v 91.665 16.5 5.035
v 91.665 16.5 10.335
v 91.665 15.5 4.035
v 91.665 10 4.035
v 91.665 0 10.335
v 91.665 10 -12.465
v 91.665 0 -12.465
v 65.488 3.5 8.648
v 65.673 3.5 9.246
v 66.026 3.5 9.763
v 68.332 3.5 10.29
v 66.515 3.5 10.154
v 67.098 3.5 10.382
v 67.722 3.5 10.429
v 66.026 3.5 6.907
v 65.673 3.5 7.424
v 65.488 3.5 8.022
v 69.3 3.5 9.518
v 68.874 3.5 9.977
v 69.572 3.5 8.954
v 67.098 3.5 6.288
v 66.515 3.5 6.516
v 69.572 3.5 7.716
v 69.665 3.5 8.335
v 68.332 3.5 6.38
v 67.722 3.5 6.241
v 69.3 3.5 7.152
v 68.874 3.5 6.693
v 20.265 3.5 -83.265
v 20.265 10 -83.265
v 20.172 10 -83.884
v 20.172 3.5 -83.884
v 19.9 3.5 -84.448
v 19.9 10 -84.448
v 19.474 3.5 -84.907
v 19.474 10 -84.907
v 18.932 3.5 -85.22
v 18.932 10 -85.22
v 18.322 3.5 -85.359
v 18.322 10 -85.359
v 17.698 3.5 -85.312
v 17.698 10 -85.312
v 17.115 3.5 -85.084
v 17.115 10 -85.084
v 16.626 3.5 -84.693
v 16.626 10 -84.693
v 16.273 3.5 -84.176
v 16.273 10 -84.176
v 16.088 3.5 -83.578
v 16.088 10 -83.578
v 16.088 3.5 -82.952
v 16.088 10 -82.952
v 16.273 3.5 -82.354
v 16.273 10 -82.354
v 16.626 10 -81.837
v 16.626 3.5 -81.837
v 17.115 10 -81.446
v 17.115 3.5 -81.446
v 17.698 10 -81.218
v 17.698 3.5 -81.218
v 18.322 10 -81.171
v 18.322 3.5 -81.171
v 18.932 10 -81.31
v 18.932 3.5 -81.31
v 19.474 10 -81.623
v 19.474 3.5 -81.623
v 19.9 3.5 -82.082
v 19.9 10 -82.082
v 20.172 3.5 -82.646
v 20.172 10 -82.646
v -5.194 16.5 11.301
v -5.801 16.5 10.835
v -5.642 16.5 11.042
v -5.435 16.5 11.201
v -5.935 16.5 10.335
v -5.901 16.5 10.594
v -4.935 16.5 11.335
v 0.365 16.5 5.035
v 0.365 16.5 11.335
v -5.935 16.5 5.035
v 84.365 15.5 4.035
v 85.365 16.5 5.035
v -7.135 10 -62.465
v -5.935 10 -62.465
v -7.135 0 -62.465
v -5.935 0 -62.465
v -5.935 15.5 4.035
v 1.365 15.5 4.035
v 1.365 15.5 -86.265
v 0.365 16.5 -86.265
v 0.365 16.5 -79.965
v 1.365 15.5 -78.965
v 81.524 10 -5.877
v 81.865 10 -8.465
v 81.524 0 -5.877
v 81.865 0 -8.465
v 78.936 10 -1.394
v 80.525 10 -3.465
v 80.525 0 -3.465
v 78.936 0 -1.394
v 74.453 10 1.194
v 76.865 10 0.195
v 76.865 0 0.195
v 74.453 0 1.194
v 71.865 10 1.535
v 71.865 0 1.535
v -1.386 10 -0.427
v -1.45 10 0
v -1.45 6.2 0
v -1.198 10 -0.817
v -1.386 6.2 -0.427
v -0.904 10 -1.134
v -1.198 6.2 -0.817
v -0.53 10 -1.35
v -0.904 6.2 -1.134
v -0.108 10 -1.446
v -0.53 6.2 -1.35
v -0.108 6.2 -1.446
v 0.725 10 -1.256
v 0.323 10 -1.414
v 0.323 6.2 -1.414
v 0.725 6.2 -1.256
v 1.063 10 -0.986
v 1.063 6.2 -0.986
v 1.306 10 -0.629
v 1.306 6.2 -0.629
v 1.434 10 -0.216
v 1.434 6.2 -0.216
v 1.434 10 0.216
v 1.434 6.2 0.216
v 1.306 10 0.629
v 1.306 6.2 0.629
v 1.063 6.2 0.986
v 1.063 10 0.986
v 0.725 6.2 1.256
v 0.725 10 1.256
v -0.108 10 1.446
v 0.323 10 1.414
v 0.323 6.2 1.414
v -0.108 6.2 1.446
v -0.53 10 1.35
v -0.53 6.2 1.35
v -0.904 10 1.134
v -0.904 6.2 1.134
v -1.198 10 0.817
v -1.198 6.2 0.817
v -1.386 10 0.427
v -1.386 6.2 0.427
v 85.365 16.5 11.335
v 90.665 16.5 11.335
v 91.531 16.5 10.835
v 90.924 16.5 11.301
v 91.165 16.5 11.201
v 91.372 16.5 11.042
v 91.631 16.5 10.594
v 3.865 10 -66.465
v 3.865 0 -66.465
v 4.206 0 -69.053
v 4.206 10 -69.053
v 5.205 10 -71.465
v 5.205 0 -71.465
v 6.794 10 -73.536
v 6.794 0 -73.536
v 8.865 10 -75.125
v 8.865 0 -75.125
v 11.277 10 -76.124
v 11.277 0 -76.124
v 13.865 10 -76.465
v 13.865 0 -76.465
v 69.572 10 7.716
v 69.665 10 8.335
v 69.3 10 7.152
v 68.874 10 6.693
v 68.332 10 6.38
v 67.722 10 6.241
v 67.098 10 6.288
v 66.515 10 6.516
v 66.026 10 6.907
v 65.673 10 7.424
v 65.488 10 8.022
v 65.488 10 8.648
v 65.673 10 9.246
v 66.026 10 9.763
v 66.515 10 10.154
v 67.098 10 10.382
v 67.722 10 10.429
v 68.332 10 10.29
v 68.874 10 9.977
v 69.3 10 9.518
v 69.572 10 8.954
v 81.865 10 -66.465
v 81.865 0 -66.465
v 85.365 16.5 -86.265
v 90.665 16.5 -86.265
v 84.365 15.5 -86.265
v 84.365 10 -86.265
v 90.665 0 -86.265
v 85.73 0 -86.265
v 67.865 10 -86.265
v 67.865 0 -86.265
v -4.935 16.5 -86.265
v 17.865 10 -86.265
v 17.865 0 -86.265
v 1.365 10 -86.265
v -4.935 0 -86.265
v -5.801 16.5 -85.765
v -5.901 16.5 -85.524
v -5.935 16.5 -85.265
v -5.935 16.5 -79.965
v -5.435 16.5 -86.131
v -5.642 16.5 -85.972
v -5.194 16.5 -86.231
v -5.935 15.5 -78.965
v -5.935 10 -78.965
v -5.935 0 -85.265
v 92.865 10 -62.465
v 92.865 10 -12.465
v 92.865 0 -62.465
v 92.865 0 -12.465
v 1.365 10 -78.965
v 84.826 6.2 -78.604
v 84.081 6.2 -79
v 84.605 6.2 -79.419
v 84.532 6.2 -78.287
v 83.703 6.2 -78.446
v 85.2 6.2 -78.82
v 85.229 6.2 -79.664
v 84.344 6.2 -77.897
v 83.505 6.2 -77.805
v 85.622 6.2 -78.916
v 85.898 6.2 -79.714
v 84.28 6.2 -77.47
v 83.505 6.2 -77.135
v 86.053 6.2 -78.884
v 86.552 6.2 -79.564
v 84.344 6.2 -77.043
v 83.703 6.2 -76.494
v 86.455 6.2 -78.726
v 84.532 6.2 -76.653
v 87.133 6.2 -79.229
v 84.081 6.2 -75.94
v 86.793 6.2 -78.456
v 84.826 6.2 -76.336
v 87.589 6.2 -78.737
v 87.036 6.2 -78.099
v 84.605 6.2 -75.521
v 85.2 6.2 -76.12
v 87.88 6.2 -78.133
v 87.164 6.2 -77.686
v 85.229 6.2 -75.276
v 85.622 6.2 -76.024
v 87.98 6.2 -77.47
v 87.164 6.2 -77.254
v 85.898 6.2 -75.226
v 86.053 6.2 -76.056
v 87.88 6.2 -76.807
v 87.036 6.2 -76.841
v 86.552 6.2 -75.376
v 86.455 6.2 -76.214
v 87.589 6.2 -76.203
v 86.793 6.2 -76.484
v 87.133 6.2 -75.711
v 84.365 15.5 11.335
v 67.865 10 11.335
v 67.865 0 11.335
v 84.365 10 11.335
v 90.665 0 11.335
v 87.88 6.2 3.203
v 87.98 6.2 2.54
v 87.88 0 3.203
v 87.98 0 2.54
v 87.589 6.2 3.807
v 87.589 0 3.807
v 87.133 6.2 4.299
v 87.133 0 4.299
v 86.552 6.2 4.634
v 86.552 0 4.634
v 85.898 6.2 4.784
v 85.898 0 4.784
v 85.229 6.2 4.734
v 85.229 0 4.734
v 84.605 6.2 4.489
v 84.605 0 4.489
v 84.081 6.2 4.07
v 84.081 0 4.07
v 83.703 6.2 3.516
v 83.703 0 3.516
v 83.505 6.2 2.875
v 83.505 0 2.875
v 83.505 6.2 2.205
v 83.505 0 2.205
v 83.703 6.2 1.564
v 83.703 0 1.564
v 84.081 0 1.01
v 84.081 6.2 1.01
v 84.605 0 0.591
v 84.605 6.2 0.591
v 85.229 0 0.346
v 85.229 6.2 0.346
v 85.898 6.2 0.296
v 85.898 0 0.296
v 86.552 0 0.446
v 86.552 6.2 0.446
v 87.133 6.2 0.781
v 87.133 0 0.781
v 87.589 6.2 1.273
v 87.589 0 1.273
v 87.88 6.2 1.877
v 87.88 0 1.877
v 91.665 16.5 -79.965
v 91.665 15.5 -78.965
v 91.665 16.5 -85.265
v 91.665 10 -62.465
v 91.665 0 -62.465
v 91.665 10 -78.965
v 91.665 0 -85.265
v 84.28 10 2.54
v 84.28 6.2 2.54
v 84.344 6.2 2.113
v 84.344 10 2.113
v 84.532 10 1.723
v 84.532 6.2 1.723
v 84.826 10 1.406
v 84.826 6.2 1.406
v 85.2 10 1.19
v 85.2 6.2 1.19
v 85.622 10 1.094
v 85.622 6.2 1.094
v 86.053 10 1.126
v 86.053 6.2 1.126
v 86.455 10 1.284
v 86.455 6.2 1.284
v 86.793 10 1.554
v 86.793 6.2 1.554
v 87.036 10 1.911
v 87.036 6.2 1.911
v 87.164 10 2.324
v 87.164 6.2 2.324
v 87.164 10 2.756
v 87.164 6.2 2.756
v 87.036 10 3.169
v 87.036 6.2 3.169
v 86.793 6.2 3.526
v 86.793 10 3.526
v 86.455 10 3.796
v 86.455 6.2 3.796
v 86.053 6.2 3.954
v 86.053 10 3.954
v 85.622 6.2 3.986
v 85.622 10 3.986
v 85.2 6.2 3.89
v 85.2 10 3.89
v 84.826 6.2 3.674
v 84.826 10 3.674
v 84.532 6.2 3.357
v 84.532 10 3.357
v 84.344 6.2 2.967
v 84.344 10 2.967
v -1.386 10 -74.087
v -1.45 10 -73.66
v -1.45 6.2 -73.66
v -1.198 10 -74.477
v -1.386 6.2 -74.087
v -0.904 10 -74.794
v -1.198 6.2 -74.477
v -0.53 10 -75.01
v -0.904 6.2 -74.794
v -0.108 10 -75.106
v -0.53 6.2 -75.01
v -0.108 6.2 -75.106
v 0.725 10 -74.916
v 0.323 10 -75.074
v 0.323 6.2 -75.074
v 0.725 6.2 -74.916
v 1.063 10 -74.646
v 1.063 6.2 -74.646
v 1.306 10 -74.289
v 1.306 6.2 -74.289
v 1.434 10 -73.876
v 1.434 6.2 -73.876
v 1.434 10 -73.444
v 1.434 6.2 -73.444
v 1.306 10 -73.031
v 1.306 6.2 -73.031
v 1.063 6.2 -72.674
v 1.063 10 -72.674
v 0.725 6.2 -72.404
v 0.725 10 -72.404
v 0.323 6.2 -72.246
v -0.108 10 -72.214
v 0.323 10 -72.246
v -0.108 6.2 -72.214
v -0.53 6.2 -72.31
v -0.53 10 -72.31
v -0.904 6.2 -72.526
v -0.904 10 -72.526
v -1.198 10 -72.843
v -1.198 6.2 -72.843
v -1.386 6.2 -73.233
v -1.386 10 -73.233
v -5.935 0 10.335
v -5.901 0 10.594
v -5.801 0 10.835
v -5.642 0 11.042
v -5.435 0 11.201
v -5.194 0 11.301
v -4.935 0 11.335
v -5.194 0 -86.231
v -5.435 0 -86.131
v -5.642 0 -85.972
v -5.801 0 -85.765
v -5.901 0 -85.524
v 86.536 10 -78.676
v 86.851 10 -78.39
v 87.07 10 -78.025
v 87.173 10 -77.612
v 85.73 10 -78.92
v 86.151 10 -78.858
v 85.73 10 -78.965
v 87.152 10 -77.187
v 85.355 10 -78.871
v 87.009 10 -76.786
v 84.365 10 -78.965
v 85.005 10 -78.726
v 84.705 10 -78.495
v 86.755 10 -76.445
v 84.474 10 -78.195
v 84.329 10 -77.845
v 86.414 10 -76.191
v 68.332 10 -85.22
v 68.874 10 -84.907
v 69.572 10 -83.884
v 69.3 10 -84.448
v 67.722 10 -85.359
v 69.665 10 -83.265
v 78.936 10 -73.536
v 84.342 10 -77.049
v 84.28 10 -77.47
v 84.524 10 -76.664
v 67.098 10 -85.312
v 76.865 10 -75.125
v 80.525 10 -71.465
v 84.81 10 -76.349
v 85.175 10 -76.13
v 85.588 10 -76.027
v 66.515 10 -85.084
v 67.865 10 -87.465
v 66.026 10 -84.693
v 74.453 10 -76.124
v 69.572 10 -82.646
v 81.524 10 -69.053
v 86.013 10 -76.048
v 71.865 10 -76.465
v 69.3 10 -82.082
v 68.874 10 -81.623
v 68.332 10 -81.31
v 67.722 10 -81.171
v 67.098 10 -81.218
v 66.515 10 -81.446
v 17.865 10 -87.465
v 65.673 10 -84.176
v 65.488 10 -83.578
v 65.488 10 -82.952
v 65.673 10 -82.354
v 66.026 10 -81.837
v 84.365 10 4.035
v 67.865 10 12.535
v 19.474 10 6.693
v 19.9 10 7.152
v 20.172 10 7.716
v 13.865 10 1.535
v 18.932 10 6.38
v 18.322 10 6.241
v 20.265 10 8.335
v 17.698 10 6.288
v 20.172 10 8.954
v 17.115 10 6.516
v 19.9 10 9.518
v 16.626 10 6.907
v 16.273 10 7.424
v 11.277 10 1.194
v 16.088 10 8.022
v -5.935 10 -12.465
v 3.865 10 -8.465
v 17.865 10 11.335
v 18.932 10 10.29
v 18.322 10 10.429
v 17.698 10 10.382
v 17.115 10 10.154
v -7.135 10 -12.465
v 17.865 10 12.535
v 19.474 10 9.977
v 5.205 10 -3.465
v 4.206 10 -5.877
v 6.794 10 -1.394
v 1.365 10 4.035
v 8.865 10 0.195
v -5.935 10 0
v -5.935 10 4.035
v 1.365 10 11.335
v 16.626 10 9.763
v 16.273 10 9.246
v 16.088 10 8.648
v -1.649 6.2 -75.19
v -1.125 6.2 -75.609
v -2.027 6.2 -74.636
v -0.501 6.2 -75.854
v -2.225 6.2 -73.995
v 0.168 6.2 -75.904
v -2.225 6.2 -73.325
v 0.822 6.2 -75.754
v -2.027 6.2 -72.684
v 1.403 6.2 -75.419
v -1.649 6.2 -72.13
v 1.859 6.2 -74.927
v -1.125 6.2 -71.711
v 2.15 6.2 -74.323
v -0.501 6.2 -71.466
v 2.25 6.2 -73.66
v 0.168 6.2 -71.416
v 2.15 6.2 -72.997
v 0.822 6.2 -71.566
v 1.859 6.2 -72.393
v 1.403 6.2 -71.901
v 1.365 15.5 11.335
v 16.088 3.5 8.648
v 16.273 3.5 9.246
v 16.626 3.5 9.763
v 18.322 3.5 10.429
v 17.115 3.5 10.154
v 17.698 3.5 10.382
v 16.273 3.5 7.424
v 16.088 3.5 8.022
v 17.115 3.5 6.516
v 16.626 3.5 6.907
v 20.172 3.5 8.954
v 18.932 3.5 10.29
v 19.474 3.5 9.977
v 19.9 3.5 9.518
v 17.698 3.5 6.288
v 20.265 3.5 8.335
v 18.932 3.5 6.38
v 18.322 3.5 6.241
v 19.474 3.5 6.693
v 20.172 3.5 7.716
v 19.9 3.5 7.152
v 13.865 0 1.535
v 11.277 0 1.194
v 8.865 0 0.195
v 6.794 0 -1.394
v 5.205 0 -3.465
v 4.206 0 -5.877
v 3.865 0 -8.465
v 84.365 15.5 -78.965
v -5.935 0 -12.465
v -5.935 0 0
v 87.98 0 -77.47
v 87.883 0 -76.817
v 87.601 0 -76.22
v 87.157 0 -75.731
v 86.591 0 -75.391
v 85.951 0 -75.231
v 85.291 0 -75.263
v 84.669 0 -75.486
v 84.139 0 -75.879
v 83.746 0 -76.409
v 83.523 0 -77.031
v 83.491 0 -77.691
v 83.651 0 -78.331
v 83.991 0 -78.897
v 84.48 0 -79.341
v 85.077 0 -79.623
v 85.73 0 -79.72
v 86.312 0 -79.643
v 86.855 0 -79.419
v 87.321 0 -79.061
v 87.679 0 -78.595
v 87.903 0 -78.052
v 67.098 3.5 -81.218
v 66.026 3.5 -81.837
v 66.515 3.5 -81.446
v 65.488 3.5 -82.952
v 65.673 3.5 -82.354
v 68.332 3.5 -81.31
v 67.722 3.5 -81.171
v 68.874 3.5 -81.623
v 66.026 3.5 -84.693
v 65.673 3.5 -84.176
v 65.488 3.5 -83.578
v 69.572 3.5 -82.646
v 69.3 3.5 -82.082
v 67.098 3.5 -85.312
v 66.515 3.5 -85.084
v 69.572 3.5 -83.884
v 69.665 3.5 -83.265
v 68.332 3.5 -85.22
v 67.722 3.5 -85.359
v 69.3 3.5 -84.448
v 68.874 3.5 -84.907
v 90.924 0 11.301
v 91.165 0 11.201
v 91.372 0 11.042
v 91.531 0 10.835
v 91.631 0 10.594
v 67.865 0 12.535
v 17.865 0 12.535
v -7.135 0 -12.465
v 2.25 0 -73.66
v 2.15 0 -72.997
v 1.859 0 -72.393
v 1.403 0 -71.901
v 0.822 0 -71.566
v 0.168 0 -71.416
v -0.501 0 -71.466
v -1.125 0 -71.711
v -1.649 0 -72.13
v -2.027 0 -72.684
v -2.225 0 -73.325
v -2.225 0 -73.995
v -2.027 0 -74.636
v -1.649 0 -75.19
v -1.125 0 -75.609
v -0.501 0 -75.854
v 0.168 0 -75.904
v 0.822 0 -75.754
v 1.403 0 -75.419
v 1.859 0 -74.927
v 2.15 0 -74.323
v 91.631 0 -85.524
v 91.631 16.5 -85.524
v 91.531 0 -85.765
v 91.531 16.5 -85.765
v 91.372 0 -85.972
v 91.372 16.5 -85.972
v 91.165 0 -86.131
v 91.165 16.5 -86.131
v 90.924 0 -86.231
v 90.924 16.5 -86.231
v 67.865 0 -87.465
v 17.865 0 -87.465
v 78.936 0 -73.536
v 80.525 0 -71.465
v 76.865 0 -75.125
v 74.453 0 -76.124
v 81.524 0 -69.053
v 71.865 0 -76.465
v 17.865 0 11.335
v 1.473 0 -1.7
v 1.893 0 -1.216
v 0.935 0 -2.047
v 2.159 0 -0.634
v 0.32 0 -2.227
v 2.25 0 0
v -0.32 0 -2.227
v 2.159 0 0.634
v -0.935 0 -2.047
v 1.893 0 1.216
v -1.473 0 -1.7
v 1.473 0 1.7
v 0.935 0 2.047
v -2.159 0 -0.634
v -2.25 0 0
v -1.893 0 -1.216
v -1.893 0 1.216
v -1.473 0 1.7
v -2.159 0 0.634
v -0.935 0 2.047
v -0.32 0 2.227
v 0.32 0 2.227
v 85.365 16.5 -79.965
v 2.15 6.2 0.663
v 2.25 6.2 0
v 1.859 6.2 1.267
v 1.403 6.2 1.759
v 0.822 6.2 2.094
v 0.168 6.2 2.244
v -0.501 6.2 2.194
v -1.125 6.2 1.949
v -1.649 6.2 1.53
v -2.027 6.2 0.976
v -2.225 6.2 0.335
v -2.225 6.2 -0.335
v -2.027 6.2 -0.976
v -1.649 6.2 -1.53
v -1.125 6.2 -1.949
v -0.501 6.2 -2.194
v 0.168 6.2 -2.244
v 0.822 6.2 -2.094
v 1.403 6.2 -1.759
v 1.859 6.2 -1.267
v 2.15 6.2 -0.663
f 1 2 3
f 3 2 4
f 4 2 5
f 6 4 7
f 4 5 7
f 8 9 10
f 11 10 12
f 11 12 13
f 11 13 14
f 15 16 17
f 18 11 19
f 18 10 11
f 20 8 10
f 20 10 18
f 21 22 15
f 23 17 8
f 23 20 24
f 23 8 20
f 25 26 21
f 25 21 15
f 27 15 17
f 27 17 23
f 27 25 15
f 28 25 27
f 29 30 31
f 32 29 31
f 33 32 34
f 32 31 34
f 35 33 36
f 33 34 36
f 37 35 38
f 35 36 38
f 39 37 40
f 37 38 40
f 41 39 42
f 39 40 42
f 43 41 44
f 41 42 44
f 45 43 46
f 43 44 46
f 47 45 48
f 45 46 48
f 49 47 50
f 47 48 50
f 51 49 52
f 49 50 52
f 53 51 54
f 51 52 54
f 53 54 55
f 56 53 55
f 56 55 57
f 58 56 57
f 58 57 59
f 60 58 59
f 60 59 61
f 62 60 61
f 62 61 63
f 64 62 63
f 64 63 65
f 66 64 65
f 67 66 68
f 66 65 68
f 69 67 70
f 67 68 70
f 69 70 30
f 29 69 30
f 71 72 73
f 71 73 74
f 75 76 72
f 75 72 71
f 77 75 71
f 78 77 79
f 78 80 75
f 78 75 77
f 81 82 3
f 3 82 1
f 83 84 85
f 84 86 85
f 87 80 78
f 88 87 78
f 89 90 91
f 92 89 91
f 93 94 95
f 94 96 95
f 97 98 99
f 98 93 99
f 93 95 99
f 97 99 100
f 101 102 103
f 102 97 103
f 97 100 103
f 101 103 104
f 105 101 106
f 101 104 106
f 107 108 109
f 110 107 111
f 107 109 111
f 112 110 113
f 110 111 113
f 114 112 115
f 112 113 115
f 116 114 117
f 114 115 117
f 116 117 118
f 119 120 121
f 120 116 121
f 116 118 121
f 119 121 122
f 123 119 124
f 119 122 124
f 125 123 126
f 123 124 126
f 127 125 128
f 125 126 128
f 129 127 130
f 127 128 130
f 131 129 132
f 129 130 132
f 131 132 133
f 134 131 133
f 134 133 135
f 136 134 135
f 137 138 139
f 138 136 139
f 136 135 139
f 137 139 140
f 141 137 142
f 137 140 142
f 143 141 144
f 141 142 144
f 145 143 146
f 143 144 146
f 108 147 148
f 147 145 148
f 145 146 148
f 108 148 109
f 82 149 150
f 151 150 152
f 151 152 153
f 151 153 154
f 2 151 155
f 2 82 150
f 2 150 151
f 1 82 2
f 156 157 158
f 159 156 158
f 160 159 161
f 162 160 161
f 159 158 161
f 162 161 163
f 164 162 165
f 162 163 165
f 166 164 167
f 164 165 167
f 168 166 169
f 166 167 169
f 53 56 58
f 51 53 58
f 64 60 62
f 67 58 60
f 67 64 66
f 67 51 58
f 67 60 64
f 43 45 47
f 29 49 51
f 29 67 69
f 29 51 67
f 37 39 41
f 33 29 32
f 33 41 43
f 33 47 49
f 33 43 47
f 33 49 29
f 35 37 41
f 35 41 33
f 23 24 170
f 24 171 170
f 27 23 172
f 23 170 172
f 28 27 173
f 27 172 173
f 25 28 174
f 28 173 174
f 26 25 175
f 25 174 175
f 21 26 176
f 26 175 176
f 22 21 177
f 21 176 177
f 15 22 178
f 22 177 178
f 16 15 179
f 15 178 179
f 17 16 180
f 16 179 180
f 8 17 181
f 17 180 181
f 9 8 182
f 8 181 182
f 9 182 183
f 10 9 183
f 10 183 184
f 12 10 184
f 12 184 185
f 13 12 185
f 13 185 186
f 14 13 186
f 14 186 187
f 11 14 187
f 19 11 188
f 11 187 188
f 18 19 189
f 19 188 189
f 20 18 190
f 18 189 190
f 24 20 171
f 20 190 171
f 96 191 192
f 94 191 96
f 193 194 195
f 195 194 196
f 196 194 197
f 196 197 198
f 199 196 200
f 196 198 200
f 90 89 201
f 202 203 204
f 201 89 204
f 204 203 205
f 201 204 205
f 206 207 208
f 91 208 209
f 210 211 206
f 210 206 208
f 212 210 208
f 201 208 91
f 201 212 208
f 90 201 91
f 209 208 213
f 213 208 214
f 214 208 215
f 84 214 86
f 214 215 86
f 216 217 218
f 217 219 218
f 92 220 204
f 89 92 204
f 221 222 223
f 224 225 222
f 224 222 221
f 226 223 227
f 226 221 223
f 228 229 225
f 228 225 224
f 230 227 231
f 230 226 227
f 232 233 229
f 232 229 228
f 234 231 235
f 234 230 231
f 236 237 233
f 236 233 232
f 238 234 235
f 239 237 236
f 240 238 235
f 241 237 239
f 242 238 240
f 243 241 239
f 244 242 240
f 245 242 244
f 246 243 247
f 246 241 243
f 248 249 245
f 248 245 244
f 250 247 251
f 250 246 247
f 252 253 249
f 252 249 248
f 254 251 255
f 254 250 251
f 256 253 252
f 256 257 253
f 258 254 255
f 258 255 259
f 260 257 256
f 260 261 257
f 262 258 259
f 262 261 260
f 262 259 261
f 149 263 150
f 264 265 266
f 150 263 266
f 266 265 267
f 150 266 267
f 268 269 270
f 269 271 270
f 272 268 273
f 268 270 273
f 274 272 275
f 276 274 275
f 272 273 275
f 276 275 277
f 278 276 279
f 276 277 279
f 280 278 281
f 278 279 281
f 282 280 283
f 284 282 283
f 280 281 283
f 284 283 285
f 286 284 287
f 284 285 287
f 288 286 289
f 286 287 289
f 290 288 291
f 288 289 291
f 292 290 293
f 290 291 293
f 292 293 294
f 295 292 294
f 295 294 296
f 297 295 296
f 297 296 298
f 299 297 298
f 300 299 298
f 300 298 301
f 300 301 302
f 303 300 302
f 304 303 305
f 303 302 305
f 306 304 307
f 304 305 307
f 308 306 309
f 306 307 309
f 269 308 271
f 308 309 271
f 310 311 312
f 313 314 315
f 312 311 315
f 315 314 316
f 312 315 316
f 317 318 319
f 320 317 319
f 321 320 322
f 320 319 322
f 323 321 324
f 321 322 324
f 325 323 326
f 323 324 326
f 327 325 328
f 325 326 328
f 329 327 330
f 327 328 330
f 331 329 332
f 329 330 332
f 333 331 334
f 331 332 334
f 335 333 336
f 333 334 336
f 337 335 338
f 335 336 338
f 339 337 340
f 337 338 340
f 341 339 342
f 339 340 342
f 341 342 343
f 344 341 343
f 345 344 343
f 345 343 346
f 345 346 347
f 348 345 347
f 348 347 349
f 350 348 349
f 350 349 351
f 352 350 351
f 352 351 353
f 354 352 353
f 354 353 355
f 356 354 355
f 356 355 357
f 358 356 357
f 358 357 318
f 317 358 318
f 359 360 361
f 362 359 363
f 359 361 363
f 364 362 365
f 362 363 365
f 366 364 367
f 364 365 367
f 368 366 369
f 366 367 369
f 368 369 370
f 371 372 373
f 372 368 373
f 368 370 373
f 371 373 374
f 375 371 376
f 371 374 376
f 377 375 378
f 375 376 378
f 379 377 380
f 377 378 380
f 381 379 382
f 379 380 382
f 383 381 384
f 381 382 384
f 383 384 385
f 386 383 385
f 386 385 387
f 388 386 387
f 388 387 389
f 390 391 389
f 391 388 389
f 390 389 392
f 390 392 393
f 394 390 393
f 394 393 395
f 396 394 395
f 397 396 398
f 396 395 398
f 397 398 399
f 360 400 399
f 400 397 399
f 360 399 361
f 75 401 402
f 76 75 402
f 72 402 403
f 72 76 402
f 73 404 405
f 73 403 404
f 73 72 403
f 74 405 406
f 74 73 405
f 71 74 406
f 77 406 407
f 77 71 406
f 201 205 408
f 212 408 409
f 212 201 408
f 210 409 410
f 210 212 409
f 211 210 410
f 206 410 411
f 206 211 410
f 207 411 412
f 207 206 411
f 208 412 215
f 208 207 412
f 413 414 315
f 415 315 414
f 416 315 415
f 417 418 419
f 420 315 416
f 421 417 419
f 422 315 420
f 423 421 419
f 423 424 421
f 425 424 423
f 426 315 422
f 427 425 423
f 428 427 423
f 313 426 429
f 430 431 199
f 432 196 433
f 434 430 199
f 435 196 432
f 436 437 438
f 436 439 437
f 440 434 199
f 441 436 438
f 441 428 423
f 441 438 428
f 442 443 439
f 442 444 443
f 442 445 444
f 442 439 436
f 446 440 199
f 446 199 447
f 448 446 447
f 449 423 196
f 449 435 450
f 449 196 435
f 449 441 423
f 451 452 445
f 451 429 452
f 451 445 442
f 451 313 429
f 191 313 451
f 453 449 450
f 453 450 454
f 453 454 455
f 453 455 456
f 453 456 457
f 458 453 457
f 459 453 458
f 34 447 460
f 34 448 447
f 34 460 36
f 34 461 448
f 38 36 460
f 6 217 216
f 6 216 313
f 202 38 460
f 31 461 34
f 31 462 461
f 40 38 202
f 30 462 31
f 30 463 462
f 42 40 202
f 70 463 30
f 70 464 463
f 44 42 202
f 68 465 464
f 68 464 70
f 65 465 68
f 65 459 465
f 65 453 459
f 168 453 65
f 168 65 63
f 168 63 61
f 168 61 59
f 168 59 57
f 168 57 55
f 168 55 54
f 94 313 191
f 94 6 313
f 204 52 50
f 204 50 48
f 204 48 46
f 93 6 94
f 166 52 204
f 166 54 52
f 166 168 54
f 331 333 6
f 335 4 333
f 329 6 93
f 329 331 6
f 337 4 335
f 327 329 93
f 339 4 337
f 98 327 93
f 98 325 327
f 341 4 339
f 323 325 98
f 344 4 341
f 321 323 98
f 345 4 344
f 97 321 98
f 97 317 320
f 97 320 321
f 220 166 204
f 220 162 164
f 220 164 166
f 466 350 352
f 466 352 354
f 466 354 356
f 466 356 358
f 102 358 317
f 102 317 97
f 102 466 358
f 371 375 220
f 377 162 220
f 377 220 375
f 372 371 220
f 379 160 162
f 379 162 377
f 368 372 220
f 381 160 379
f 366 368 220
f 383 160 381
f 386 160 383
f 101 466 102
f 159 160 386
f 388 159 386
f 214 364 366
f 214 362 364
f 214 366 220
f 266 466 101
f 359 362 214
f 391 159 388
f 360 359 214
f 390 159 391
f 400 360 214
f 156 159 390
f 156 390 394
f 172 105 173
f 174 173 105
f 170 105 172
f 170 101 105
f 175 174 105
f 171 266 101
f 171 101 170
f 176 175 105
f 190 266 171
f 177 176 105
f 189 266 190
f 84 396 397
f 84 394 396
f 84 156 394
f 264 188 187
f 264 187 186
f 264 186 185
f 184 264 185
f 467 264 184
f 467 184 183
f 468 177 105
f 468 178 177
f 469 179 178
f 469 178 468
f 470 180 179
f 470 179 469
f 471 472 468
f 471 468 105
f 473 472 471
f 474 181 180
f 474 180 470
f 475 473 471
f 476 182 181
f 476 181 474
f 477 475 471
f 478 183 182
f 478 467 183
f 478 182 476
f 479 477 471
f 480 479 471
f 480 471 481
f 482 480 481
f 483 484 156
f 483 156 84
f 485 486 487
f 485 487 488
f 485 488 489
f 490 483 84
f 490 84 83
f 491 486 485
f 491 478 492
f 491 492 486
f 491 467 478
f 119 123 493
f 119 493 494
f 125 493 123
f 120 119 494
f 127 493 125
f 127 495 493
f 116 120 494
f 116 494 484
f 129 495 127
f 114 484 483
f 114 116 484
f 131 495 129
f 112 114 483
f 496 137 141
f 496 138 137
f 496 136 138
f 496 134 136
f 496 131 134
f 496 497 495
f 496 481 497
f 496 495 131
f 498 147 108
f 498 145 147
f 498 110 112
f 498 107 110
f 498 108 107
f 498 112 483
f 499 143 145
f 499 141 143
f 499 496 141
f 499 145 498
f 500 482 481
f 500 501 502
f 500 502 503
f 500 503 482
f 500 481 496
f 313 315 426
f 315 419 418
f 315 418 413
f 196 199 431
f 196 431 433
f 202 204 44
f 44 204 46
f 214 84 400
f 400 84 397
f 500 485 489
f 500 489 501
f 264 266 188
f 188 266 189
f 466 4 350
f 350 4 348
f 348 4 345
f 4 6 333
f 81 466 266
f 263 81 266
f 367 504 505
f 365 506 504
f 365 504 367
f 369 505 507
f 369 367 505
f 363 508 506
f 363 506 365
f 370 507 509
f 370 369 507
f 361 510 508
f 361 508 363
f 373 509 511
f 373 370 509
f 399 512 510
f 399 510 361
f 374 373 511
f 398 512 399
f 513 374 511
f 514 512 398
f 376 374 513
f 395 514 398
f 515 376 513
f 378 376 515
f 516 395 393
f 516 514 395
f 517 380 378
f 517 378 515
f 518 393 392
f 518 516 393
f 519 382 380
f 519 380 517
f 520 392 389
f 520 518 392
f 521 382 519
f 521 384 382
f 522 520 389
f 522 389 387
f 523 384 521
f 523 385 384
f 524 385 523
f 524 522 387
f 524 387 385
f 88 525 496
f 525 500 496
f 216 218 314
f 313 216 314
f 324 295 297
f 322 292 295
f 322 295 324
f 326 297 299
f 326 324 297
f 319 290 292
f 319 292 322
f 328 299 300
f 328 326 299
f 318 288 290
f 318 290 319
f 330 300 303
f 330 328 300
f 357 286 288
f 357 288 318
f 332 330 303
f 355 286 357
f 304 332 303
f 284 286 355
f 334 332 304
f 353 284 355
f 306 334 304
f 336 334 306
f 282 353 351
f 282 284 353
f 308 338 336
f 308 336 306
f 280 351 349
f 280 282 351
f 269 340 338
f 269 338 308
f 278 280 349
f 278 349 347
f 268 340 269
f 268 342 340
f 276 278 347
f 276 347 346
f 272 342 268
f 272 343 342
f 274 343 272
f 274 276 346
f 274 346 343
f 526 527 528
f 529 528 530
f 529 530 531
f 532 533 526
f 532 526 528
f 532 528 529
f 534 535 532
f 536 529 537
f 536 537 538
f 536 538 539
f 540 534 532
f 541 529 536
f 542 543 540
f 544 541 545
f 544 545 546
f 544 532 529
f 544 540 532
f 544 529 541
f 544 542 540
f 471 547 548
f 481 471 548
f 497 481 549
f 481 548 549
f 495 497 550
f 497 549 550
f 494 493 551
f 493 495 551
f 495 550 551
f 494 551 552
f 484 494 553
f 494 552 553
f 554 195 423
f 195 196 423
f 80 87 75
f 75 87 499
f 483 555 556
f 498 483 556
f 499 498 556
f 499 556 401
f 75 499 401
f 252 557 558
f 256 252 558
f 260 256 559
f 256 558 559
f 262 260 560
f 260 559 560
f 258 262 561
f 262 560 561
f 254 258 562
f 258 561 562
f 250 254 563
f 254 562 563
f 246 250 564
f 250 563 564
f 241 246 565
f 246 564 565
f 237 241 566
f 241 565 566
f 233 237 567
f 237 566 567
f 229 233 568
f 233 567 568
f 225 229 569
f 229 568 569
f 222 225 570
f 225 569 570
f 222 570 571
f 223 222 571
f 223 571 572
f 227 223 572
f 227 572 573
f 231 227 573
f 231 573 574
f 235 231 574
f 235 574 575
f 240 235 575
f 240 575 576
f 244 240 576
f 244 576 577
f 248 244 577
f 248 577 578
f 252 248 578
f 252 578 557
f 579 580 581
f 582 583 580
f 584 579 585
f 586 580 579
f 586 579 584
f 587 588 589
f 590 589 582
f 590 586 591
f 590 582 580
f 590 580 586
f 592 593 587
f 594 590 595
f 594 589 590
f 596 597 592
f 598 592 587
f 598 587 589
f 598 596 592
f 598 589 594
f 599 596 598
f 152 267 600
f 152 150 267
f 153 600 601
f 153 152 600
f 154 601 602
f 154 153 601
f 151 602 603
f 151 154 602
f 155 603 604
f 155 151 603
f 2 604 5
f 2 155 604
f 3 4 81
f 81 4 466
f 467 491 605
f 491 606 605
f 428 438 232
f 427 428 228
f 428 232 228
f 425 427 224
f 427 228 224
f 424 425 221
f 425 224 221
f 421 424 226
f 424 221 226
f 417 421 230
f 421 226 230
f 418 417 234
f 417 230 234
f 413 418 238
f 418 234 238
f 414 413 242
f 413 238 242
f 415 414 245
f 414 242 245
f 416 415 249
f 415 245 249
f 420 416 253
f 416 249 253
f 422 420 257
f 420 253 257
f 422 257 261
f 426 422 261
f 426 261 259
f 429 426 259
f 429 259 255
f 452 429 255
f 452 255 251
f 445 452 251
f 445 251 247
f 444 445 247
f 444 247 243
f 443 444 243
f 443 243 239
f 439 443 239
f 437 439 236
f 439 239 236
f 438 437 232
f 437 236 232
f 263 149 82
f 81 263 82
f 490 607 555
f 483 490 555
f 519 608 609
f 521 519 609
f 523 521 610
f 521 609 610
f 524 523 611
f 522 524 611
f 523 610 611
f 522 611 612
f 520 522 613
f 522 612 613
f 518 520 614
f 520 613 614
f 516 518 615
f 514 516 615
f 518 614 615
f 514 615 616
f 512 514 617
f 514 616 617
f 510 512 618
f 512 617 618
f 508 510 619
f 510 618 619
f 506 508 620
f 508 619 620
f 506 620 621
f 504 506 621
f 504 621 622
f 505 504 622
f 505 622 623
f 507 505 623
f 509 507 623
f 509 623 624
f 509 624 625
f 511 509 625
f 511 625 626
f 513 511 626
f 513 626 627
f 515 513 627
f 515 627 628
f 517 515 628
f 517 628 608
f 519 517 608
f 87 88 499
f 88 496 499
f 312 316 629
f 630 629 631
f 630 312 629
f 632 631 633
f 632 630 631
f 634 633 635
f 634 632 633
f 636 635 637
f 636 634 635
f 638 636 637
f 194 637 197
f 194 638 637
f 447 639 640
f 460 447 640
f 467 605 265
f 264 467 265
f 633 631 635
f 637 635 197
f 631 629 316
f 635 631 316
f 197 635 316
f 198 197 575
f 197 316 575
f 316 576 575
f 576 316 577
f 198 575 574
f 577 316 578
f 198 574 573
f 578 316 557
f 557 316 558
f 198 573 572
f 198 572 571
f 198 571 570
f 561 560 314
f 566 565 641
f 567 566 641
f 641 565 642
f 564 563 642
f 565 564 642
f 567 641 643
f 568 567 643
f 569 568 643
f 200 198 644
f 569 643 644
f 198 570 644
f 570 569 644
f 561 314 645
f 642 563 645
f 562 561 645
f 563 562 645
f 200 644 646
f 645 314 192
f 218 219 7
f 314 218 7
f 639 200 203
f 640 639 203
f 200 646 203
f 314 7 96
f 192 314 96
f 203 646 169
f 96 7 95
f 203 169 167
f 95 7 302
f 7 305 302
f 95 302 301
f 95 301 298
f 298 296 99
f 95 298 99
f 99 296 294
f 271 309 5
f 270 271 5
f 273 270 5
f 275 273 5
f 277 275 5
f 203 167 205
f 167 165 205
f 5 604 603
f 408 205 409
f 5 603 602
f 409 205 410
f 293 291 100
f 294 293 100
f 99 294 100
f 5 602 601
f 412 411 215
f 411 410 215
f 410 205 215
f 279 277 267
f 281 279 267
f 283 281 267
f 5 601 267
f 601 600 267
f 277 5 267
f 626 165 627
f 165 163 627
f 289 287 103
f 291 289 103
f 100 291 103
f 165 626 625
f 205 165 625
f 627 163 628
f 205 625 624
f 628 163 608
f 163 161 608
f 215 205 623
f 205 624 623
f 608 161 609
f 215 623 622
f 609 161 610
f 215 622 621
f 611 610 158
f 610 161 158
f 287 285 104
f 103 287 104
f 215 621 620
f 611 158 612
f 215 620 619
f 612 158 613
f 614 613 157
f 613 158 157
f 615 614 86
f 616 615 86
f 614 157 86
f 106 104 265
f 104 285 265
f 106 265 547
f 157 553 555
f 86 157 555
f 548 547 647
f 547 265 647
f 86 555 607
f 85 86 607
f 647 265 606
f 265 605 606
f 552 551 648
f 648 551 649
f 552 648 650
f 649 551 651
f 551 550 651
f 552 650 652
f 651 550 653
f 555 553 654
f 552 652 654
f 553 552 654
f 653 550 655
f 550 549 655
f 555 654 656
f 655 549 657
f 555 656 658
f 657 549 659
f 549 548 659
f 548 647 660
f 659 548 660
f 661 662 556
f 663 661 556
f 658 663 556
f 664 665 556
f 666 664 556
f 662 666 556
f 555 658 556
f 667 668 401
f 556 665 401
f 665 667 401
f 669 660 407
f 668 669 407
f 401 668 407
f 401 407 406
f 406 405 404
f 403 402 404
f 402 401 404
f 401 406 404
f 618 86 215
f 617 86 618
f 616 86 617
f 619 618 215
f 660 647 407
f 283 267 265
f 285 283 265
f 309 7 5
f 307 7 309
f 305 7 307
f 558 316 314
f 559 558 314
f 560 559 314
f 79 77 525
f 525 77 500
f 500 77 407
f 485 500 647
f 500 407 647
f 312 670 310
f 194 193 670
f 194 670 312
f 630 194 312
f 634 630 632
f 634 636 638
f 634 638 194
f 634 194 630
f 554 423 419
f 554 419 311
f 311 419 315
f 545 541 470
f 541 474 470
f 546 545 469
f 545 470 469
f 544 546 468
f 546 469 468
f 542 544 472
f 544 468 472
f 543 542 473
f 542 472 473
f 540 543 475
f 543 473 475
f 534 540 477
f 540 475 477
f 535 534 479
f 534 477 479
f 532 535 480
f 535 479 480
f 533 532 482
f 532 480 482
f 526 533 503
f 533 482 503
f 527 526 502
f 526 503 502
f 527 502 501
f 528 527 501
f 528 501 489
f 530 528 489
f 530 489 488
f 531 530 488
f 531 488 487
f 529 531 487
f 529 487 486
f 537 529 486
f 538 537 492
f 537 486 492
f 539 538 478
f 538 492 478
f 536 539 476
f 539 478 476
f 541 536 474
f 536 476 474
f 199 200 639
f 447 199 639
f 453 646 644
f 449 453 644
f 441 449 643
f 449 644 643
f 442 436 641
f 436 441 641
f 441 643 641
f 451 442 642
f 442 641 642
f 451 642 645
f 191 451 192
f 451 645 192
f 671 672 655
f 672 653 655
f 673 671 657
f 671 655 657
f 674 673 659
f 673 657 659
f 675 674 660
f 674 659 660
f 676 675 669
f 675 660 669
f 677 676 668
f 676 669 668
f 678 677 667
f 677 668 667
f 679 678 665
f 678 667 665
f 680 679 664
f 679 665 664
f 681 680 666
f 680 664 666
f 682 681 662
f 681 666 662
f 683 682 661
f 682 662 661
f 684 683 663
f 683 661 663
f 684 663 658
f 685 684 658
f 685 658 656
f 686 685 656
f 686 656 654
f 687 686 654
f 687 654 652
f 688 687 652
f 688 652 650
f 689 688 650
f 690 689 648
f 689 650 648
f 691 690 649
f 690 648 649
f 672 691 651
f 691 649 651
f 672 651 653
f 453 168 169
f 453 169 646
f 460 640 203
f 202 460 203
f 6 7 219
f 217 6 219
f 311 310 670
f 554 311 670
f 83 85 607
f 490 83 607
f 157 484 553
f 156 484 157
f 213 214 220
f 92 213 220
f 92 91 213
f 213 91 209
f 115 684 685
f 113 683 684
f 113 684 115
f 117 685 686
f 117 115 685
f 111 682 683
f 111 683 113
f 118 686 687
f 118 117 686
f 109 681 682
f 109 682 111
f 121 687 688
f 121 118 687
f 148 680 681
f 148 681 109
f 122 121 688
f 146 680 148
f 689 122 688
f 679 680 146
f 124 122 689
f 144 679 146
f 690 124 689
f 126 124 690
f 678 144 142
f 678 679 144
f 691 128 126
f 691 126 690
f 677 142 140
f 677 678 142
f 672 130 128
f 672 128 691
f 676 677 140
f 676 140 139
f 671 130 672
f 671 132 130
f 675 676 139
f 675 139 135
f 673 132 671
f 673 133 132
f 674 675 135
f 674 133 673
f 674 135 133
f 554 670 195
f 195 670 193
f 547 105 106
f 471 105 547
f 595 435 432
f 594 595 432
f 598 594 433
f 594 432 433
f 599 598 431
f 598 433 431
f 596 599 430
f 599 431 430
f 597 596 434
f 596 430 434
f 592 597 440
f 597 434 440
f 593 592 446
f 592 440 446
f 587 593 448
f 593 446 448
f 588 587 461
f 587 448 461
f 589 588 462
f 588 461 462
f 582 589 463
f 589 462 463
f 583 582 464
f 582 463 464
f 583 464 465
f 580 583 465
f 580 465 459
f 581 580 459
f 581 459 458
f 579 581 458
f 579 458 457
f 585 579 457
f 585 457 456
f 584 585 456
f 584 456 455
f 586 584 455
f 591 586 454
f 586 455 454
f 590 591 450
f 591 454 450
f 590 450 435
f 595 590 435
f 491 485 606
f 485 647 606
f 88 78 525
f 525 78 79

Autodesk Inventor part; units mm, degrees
ref_plane "YZ Plane" through (0, 0, 0) normal (1, 0, 0) x (0, 1, 0)
ref_plane "XZ Plane" through (0, 0, 0) normal (0, 1, 0) x (-1, 0, 0)
ref_plane "XY Plane" through (0, 0, 0) normal (0, 0, 1) x (1, 0, 0)
sketch "Sketch1" plane through (0, 0, 0) normal (0, 1, 0) x (-1, 0, 0)
  circle A0 centre (0, 0) radius 1.45
  circle A1 centre (0, -73.66) radius 1.45
  circle A2 centre (-85.73, -77.47) radius 1.45
  circle A3 centre (-85.73, 2.54) radius 1.45
  line L0 (7.135, 12.535) -> (-92.865, 12.535)
  line L1 (-92.865, 12.535) -> (-92.865, -87.465)
  line L2 (-92.865, -87.465) -> (7.135, -87.465)
  line L3 (7.135, -87.465) -> (7.135, 12.535)
  line L4 (0, 0) -> (7.135, 0)
  line L5 (-85.73, 2.54) -> (-92.865, 2.54)
  line L6 (-85.73, -77.47) -> (-85.73, -87.465)
  line L7 (-85.73, 2.54) -> (-85.73, 12.535)
  point P0 (0, 0)
  dimension "d0" = 73.66
  dimension "d1" = 80.01
  dimension "d2" = 85.73
  dimension "d3" = 2.54
  dimension "d4" = 3.81
  dimension "d6" = 2.9
  dimension "d7" = 100
  dimension "d8" = 100
extrude "Extrusion1" add sketch "Sketch1" along normal blind 10 contours L3 L2 L1 L5 A3 L7 L0 | L7 A3 L5 L1 L0
sketch "Sketch4" plane through (0, 0, 0) normal (0, -1, 0) x (1, 0, 0)
  line L0 (92.865, -87.465) -> (-7.135, -87.465) projected
  line L1 (92.865, 12.535) -> (92.865, -87.465) projected
  line L2 (-7.135, 12.535) -> (92.865, 12.535) projected
  line L3 (-7.135, -87.465) -> (-7.135, 12.535) projected
  circle A0 centre (85.73, 2.54) radius 1.45 projected
  circle A1 centre (0, 0) radius 1.45 projected
  circle A2 centre (85.73, -77.47) radius 1.45 projected
  circle A3 centre (0, -73.66) radius 1.45 projected
  circle A4 centre (0, 0) radius 2.25
  circle A5 centre (0, -73.66) radius 2.25
  circle A6 centre (85.73, -77.47) radius 2.25
  circle A7 centre (85.73, 2.54) radius 2.25
  point P0 (0, 0)
  dimension "d13" = 4.5
  dimension "d14" = 4.5
  dimension "d15" = 4.5
  dimension "d16" = 4.5
extrude "Extrusion2" cut sketch "Sketch4" against normal blind 6.2 contours A0 | A1 | A2 | A3 | A4 | A5 | A6 | A7
sketch "Sketch5" plane through (0, 0, 0) normal (0, -1, 0) x (1, 0, 0)
  circle A0 centre (85.73, 2.54) radius 2.25 projected
  circle A1 centre (0, 0) radius 2.25 projected
  circle A2 centre (85.73, -77.47) radius 2.25 projected
  circle A3 centre (0, -73.66) radius 2.25 projected
  line L0 (92.865, -87.465) -> (-7.135, -87.465) projected
  line L1 (92.865, 12.535) -> (92.865, -87.465) projected
  line L2 (-7.135, 12.535) -> (92.865, 12.535) projected
  line L3 (-7.135, -87.465) -> (-7.135, 12.535) projected
  line L4 (-7.135, -87.465) -> (92.865, 12.535)
  line L5 (-7.135, -12.465) -> (-5.935, -12.465)
  line L6 (-5.935, -12.465) -> (-5.935, 11.335)
  line L7 (-5.935, 11.335) -> (17.865, 11.335)
  line L8 (17.865, 11.335) -> (17.865, 12.535)
  line L9 (-7.135, 12.535) -> (92.865, 12.535) projected
  line L10 (17.865, -86.265) -> (-5.935, -86.265)
  line L11 (-5.935, -62.465) -> (-7.135, -62.465)
  line L12 (-5.935, -86.265) -> (-5.935, -62.465)
  line L13 (17.865, -87.465) -> (17.865, -86.265)
  line L14 (91.665, -62.465) -> (91.665, -86.265)
  line L15 (67.865, -86.265) -> (67.865, -87.465)
  line L16 (91.665, -86.265) -> (67.865, -86.265)
  line L17 (92.865, -62.465) -> (91.665, -62.465)
  line L18 (67.865, 11.335) -> (91.665, 11.335)
  line L19 (91.665, -12.465) -> (92.865, -12.465)
  line L20 (91.665, 11.335) -> (91.665, -12.465)
  line L21 (67.865, 12.535) -> (67.865, 11.335)
  point P0 (0, 0)
  point P1 (42.865, -37.465)
  point P2 (17.865, 12.535)
  point P3 (17.865, -87.465)
  point P4 (-7.135, -62.465)
  point P5 (67.865, -87.465)
  point P6 (92.865, -62.465)
  point P7 (67.865, 12.535)
  point P8 (92.865, -12.465)
  dimension "d19" = 1.2
  dimension "d20" = 1.2
  dimension "d21" = 25
  dimension "d22" = 25
  dimension "d27" = 360
extrude "Extrusion3" cut sketch "Sketch5" along normal through all both and the other way through all contours L18 L21 L2 L4 | L4 L1 L19 L20 | L10 L13 L0 L4 | L4 L3 L11 L12 | L1 L0 L15 L16 L14 L17 | L8 L7 L6 L5 L3 L2
fillet "Fillet1" radius 1 4 edges at (-5.935, 5, -86.265) (91.665, 5, -86.265) (-5.935, 5, 11.335) (91.665, 5, 11.335)
sketch "Sketch6" plane through (0, 10, 0) normal (0, 1, 0) x (1, 0, 0)
  arc A0 (90.665, -11.335) -> (91.665, -10.335) centre (90.665, -10.335) ccw projected
  line L0 (91.665, -10.335) -> (91.665, 12.465) projected
  line L1 (91.665, 12.465) -> (92.865, 12.465) projected
  line L2 (92.865, 12.465) -> (92.865, 62.465) projected
  line L3 (92.865, 62.465) -> (91.665, 62.465) projected
  line L4 (91.665, 62.465) -> (91.665, 85.265) projected
  arc A1 (91.665, 85.265) -> (90.665, 86.265) centre (90.665, 85.265) ccw projected
  line L5 (90.665, 86.265) -> (67.865, 86.265) projected
  line L6 (67.865, 86.265) -> (67.865, 87.465) projected
  line L7 (67.865, 87.465) -> (17.865, 87.465) projected
  line L8 (17.865, 87.465) -> (17.865, 86.265) projected
  line L9 (17.865, 86.265) -> (-4.935, 86.265) projected
  arc A2 (-4.935, 86.265) -> (-5.935, 85.265) centre (-4.935, 85.265) ccw projected
  line L10 (-5.935, 85.265) -> (-5.935, 62.465) projected
  line L11 (-5.935, 62.465) -> (-7.135, 62.465) projected
  line L12 (-7.135, 62.465) -> (-7.135, 12.465) projected
  line L13 (-7.135, 12.465) -> (-5.935, 12.465) projected
  line L14 (-5.935, 12.465) -> (-5.935, -10.335) projected
  arc A3 (-5.935, -10.335) -> (-4.935, -11.335) centre (-4.935, -10.335) ccw projected
  line L15 (-4.935, -11.335) -> (17.865, -11.335) projected
  line L16 (17.865, -11.335) -> (17.865, -12.535) projected
  line L17 (17.865, -12.535) -> (67.865, -12.535) projected
  line L18 (67.865, -12.535) -> (67.865, -11.335) projected
  line L19 (67.865, -11.335) -> (90.665, -11.335) projected
  circle A4 centre (0, 73.66) radius 1.45 projected
  circle A5 centre (85.73, 77.47) radius 1.45 projected
  circle A6 centre (0, 0) radius 1.45 projected
  circle A7 centre (85.73, -2.54) radius 1.45 projected
  line L20 (-5.935, -11.335) -> (1.365, -11.335)
  line L21 (1.365, -11.335) -> (1.365, -4.035)
  line L22 (1.365, -4.035) -> (-5.935, -4.035)
  line L23 (-5.935, -4.035) -> (-5.935, -11.335)
  line L24 (-7.135, 62.465) -> (-7.135, 12.465) projected
  line L25 (-7.135, 37.465) -> (92.865, 37.465)
  line L26 (92.865, 12.465) -> (92.865, 62.465) projected
  line L27 (84.365, -11.335) -> (91.665, -11.335)
  line L28 (84.365, -4.035) -> (84.365, -11.335)
  line L29 (91.665, -4.035) -> (84.365, -4.035)
  line L30 (91.665, -11.335) -> (91.665, -4.035)
  line L31 (91.665, 78.965) -> (91.665, 86.265)
  line L32 (84.365, 78.965) -> (91.665, 78.965)
  line L33 (84.365, 86.265) -> (84.365, 78.965)
  line L34 (91.665, 86.265) -> (84.365, 86.265)
  line L35 (1.365, 86.265) -> (-5.935, 86.265)
  line L36 (1.365, 78.965) -> (1.365, 86.265)
  line L37 (-5.935, 78.965) -> (1.365, 78.965)
  line L38 (-5.935, 86.265) -> (-5.935, 78.965)
  point P0 (0, 0)
  point P1 (-5.935, -4.035)
  point P2 (1.365, -11.335)
  point P3 (42.865, 37.465)
  point P4 (-5.935, 78.965)
  point P5 (84.365, 86.265)
  point P6 (85.6076, 78.965)
  point P7 (85.8524, 78.965)
  point P8 (91.665, 78.965)
  point P9 (91.665, -4.035)
  point P10 (84.365, -11.335)
  dimension "d30" = 7.3
  dimension "d31" = 7.3
  dimension "d39" = 360
extrude "Extrusion4" add sketch "Sketch6" along normal blind 6.5 contours L19 L28 L29 L0 A0 | L15 A3 L14 L22 L21 | L32 L33 L5 A1 L4 | L10 A2 L9 L36 L37
chamfer "Chamfer1" distance 1 angle 45 8 edges at (-2.285, 16.5, 4.035) (1.365, 16.5, 7.685) (1.365, 16.5, -82.615) (-2.285, 16.5, -78.965) (84.365, 16.5, -82.615) (88.015, 16.5, -78.965) (88.015, 16.5, 4.035) (84.365, 16.5, 7.685)
sketch "Sketch7" plane through (0, 10, 0) normal (0, 1, 0) x (1, 0, 0)
  circle A0 centre (85.73, -2.54) radius 1.45 projected
  circle A1 centre (0, 0) radius 1.45 projected
  circle A2 centre (85.73, 77.47) radius 1.45 projected
  circle A3 centre (0, 73.66) radius 1.45 projected
  line L0 (1.365, 86.265) -> (1.365, 78.965) projected
  line L1 (1.365, 78.965) -> (-5.935, 78.965) projected
  line L2 (-5.935, 78.965) -> (-5.935, 62.465) projected
  line L3 (-5.935, 62.465) -> (-7.135, 62.465) projected
  line L4 (-7.135, 62.465) -> (-7.135, 12.465) projected
  line L5 (-7.135, 12.465) -> (-5.935, 12.465) projected
  line L6 (-5.935, 12.465) -> (-5.935, -4.035) projected
  line L7 (-5.935, -4.035) -> (1.365, -4.035) projected
  line L8 (1.365, -4.035) -> (1.365, -11.335) projected
  line L9 (1.365, -11.335) -> (17.865, -11.335) projected
  line L10 (17.865, -11.335) -> (17.865, -12.535) projected
  line L11 (17.865, -12.535) -> (67.865, -12.535) projected
  line L12 (67.865, -12.535) -> (67.865, -11.335) projected
  line L13 (67.865, -11.335) -> (84.365, -11.335) projected
  line L14 (84.365, -11.335) -> (84.365, -4.035) projected
  line L15 (84.365, -4.035) -> (91.665, -4.035) projected
  line L16 (91.665, -4.035) -> (91.665, 12.465) projected
  line L17 (91.665, 12.465) -> (92.865, 12.465) projected
  line L18 (92.865, 12.465) -> (92.865, 62.465) projected
  line L19 (92.865, 62.465) -> (91.665, 62.465) projected
  line L20 (91.665, 62.465) -> (91.665, 78.965) projected
  line L21 (91.665, 78.965) -> (84.365, 78.965) projected
  line L22 (84.365, 78.965) -> (84.365, 86.265) projected
  line L23 (84.365, 86.265) -> (67.865, 86.265) projected
  line L24 (67.865, 86.265) -> (67.865, 87.465) projected
  line L25 (67.865, 87.465) -> (17.865, 87.465) projected
  line L26 (17.865, 87.465) -> (17.865, 86.265) projected
  line L27 (17.865, 86.265) -> (1.365, 86.265) projected
  line L28 (3.865, 76.465) -> (81.865, 76.465)
  line L29 (81.865, 76.465) -> (81.865, -1.535)
  line L30 (81.865, -1.535) -> (3.865, -1.535)
  line L31 (3.865, -1.535) -> (3.865, 76.465)
  point P0 (0, 0)
  dimension "d50" = 11
  dimension "d51" = 11
  dimension "d52" = 11
  dimension "d53" = 11
extrude "Extrusion5" cut sketch "Sketch7" against normal blind 10 contours L28 L29 L30 L31
fillet "Fillet2" radius 10 4 edges at (3.865, 5, -76.465) (81.865, 5, -76.465) (81.865, 5, 1.535) (3.865, 5, 1.535)
sketch "Sketch8" plane through (0, 10, 0) normal (0, 1, 0) x (1, 0, 0)
  line L0 (17.865, -12.535) -> (67.865, -12.535) projected
  line L1 (42.865, -12.535) -> (42.865, 87.465)
  line L2 (67.865, 87.465) -> (17.865, 87.465) projected
  line L3 (67.565, 83.265) -> (18.165, 83.265)
  line L4 (18.165, 83.265) -> (18.165, -8.335)
  line L5 (18.165, -8.335) -> (67.565, -8.335)
  line L6 (67.565, -8.335) -> (67.565, 83.265)
  line L7 (67.565, 83.265) -> (18.165, -8.335) construction
  line L8 (18.165, 83.265) -> (67.565, -8.335) construction
  circle A0 centre (18.165, 83.265) radius 2.1
  circle A1 centre (18.165, -8.335) radius 2.1
  circle A2 centre (67.565, -8.335) radius 2.1
  circle A3 centre (67.565, 83.265) radius 2.1
  point P0 (0, 0)
  point P1 (42.865, 37.465)
  dimension "d57" = 49.4
  dimension "d58" = 91.6
  dimension "d59" = 4.2
  dimension "d60" = 4.2
  dimension "d61" = 4.2
  dimension "d62" = 4.2
extrude "Extrusion6" cut sketch "Sketch8" against normal blind 6.5 contours A1 L4 L5 | L5 L4 A1 | A2 L6 L5 | L5 L6 A2 | A3 L6 L3 | L3 L6 A3 | A0 L4 L3 | L3 L4 A0
properties part number "TopSide" material "ABS Plastic"
